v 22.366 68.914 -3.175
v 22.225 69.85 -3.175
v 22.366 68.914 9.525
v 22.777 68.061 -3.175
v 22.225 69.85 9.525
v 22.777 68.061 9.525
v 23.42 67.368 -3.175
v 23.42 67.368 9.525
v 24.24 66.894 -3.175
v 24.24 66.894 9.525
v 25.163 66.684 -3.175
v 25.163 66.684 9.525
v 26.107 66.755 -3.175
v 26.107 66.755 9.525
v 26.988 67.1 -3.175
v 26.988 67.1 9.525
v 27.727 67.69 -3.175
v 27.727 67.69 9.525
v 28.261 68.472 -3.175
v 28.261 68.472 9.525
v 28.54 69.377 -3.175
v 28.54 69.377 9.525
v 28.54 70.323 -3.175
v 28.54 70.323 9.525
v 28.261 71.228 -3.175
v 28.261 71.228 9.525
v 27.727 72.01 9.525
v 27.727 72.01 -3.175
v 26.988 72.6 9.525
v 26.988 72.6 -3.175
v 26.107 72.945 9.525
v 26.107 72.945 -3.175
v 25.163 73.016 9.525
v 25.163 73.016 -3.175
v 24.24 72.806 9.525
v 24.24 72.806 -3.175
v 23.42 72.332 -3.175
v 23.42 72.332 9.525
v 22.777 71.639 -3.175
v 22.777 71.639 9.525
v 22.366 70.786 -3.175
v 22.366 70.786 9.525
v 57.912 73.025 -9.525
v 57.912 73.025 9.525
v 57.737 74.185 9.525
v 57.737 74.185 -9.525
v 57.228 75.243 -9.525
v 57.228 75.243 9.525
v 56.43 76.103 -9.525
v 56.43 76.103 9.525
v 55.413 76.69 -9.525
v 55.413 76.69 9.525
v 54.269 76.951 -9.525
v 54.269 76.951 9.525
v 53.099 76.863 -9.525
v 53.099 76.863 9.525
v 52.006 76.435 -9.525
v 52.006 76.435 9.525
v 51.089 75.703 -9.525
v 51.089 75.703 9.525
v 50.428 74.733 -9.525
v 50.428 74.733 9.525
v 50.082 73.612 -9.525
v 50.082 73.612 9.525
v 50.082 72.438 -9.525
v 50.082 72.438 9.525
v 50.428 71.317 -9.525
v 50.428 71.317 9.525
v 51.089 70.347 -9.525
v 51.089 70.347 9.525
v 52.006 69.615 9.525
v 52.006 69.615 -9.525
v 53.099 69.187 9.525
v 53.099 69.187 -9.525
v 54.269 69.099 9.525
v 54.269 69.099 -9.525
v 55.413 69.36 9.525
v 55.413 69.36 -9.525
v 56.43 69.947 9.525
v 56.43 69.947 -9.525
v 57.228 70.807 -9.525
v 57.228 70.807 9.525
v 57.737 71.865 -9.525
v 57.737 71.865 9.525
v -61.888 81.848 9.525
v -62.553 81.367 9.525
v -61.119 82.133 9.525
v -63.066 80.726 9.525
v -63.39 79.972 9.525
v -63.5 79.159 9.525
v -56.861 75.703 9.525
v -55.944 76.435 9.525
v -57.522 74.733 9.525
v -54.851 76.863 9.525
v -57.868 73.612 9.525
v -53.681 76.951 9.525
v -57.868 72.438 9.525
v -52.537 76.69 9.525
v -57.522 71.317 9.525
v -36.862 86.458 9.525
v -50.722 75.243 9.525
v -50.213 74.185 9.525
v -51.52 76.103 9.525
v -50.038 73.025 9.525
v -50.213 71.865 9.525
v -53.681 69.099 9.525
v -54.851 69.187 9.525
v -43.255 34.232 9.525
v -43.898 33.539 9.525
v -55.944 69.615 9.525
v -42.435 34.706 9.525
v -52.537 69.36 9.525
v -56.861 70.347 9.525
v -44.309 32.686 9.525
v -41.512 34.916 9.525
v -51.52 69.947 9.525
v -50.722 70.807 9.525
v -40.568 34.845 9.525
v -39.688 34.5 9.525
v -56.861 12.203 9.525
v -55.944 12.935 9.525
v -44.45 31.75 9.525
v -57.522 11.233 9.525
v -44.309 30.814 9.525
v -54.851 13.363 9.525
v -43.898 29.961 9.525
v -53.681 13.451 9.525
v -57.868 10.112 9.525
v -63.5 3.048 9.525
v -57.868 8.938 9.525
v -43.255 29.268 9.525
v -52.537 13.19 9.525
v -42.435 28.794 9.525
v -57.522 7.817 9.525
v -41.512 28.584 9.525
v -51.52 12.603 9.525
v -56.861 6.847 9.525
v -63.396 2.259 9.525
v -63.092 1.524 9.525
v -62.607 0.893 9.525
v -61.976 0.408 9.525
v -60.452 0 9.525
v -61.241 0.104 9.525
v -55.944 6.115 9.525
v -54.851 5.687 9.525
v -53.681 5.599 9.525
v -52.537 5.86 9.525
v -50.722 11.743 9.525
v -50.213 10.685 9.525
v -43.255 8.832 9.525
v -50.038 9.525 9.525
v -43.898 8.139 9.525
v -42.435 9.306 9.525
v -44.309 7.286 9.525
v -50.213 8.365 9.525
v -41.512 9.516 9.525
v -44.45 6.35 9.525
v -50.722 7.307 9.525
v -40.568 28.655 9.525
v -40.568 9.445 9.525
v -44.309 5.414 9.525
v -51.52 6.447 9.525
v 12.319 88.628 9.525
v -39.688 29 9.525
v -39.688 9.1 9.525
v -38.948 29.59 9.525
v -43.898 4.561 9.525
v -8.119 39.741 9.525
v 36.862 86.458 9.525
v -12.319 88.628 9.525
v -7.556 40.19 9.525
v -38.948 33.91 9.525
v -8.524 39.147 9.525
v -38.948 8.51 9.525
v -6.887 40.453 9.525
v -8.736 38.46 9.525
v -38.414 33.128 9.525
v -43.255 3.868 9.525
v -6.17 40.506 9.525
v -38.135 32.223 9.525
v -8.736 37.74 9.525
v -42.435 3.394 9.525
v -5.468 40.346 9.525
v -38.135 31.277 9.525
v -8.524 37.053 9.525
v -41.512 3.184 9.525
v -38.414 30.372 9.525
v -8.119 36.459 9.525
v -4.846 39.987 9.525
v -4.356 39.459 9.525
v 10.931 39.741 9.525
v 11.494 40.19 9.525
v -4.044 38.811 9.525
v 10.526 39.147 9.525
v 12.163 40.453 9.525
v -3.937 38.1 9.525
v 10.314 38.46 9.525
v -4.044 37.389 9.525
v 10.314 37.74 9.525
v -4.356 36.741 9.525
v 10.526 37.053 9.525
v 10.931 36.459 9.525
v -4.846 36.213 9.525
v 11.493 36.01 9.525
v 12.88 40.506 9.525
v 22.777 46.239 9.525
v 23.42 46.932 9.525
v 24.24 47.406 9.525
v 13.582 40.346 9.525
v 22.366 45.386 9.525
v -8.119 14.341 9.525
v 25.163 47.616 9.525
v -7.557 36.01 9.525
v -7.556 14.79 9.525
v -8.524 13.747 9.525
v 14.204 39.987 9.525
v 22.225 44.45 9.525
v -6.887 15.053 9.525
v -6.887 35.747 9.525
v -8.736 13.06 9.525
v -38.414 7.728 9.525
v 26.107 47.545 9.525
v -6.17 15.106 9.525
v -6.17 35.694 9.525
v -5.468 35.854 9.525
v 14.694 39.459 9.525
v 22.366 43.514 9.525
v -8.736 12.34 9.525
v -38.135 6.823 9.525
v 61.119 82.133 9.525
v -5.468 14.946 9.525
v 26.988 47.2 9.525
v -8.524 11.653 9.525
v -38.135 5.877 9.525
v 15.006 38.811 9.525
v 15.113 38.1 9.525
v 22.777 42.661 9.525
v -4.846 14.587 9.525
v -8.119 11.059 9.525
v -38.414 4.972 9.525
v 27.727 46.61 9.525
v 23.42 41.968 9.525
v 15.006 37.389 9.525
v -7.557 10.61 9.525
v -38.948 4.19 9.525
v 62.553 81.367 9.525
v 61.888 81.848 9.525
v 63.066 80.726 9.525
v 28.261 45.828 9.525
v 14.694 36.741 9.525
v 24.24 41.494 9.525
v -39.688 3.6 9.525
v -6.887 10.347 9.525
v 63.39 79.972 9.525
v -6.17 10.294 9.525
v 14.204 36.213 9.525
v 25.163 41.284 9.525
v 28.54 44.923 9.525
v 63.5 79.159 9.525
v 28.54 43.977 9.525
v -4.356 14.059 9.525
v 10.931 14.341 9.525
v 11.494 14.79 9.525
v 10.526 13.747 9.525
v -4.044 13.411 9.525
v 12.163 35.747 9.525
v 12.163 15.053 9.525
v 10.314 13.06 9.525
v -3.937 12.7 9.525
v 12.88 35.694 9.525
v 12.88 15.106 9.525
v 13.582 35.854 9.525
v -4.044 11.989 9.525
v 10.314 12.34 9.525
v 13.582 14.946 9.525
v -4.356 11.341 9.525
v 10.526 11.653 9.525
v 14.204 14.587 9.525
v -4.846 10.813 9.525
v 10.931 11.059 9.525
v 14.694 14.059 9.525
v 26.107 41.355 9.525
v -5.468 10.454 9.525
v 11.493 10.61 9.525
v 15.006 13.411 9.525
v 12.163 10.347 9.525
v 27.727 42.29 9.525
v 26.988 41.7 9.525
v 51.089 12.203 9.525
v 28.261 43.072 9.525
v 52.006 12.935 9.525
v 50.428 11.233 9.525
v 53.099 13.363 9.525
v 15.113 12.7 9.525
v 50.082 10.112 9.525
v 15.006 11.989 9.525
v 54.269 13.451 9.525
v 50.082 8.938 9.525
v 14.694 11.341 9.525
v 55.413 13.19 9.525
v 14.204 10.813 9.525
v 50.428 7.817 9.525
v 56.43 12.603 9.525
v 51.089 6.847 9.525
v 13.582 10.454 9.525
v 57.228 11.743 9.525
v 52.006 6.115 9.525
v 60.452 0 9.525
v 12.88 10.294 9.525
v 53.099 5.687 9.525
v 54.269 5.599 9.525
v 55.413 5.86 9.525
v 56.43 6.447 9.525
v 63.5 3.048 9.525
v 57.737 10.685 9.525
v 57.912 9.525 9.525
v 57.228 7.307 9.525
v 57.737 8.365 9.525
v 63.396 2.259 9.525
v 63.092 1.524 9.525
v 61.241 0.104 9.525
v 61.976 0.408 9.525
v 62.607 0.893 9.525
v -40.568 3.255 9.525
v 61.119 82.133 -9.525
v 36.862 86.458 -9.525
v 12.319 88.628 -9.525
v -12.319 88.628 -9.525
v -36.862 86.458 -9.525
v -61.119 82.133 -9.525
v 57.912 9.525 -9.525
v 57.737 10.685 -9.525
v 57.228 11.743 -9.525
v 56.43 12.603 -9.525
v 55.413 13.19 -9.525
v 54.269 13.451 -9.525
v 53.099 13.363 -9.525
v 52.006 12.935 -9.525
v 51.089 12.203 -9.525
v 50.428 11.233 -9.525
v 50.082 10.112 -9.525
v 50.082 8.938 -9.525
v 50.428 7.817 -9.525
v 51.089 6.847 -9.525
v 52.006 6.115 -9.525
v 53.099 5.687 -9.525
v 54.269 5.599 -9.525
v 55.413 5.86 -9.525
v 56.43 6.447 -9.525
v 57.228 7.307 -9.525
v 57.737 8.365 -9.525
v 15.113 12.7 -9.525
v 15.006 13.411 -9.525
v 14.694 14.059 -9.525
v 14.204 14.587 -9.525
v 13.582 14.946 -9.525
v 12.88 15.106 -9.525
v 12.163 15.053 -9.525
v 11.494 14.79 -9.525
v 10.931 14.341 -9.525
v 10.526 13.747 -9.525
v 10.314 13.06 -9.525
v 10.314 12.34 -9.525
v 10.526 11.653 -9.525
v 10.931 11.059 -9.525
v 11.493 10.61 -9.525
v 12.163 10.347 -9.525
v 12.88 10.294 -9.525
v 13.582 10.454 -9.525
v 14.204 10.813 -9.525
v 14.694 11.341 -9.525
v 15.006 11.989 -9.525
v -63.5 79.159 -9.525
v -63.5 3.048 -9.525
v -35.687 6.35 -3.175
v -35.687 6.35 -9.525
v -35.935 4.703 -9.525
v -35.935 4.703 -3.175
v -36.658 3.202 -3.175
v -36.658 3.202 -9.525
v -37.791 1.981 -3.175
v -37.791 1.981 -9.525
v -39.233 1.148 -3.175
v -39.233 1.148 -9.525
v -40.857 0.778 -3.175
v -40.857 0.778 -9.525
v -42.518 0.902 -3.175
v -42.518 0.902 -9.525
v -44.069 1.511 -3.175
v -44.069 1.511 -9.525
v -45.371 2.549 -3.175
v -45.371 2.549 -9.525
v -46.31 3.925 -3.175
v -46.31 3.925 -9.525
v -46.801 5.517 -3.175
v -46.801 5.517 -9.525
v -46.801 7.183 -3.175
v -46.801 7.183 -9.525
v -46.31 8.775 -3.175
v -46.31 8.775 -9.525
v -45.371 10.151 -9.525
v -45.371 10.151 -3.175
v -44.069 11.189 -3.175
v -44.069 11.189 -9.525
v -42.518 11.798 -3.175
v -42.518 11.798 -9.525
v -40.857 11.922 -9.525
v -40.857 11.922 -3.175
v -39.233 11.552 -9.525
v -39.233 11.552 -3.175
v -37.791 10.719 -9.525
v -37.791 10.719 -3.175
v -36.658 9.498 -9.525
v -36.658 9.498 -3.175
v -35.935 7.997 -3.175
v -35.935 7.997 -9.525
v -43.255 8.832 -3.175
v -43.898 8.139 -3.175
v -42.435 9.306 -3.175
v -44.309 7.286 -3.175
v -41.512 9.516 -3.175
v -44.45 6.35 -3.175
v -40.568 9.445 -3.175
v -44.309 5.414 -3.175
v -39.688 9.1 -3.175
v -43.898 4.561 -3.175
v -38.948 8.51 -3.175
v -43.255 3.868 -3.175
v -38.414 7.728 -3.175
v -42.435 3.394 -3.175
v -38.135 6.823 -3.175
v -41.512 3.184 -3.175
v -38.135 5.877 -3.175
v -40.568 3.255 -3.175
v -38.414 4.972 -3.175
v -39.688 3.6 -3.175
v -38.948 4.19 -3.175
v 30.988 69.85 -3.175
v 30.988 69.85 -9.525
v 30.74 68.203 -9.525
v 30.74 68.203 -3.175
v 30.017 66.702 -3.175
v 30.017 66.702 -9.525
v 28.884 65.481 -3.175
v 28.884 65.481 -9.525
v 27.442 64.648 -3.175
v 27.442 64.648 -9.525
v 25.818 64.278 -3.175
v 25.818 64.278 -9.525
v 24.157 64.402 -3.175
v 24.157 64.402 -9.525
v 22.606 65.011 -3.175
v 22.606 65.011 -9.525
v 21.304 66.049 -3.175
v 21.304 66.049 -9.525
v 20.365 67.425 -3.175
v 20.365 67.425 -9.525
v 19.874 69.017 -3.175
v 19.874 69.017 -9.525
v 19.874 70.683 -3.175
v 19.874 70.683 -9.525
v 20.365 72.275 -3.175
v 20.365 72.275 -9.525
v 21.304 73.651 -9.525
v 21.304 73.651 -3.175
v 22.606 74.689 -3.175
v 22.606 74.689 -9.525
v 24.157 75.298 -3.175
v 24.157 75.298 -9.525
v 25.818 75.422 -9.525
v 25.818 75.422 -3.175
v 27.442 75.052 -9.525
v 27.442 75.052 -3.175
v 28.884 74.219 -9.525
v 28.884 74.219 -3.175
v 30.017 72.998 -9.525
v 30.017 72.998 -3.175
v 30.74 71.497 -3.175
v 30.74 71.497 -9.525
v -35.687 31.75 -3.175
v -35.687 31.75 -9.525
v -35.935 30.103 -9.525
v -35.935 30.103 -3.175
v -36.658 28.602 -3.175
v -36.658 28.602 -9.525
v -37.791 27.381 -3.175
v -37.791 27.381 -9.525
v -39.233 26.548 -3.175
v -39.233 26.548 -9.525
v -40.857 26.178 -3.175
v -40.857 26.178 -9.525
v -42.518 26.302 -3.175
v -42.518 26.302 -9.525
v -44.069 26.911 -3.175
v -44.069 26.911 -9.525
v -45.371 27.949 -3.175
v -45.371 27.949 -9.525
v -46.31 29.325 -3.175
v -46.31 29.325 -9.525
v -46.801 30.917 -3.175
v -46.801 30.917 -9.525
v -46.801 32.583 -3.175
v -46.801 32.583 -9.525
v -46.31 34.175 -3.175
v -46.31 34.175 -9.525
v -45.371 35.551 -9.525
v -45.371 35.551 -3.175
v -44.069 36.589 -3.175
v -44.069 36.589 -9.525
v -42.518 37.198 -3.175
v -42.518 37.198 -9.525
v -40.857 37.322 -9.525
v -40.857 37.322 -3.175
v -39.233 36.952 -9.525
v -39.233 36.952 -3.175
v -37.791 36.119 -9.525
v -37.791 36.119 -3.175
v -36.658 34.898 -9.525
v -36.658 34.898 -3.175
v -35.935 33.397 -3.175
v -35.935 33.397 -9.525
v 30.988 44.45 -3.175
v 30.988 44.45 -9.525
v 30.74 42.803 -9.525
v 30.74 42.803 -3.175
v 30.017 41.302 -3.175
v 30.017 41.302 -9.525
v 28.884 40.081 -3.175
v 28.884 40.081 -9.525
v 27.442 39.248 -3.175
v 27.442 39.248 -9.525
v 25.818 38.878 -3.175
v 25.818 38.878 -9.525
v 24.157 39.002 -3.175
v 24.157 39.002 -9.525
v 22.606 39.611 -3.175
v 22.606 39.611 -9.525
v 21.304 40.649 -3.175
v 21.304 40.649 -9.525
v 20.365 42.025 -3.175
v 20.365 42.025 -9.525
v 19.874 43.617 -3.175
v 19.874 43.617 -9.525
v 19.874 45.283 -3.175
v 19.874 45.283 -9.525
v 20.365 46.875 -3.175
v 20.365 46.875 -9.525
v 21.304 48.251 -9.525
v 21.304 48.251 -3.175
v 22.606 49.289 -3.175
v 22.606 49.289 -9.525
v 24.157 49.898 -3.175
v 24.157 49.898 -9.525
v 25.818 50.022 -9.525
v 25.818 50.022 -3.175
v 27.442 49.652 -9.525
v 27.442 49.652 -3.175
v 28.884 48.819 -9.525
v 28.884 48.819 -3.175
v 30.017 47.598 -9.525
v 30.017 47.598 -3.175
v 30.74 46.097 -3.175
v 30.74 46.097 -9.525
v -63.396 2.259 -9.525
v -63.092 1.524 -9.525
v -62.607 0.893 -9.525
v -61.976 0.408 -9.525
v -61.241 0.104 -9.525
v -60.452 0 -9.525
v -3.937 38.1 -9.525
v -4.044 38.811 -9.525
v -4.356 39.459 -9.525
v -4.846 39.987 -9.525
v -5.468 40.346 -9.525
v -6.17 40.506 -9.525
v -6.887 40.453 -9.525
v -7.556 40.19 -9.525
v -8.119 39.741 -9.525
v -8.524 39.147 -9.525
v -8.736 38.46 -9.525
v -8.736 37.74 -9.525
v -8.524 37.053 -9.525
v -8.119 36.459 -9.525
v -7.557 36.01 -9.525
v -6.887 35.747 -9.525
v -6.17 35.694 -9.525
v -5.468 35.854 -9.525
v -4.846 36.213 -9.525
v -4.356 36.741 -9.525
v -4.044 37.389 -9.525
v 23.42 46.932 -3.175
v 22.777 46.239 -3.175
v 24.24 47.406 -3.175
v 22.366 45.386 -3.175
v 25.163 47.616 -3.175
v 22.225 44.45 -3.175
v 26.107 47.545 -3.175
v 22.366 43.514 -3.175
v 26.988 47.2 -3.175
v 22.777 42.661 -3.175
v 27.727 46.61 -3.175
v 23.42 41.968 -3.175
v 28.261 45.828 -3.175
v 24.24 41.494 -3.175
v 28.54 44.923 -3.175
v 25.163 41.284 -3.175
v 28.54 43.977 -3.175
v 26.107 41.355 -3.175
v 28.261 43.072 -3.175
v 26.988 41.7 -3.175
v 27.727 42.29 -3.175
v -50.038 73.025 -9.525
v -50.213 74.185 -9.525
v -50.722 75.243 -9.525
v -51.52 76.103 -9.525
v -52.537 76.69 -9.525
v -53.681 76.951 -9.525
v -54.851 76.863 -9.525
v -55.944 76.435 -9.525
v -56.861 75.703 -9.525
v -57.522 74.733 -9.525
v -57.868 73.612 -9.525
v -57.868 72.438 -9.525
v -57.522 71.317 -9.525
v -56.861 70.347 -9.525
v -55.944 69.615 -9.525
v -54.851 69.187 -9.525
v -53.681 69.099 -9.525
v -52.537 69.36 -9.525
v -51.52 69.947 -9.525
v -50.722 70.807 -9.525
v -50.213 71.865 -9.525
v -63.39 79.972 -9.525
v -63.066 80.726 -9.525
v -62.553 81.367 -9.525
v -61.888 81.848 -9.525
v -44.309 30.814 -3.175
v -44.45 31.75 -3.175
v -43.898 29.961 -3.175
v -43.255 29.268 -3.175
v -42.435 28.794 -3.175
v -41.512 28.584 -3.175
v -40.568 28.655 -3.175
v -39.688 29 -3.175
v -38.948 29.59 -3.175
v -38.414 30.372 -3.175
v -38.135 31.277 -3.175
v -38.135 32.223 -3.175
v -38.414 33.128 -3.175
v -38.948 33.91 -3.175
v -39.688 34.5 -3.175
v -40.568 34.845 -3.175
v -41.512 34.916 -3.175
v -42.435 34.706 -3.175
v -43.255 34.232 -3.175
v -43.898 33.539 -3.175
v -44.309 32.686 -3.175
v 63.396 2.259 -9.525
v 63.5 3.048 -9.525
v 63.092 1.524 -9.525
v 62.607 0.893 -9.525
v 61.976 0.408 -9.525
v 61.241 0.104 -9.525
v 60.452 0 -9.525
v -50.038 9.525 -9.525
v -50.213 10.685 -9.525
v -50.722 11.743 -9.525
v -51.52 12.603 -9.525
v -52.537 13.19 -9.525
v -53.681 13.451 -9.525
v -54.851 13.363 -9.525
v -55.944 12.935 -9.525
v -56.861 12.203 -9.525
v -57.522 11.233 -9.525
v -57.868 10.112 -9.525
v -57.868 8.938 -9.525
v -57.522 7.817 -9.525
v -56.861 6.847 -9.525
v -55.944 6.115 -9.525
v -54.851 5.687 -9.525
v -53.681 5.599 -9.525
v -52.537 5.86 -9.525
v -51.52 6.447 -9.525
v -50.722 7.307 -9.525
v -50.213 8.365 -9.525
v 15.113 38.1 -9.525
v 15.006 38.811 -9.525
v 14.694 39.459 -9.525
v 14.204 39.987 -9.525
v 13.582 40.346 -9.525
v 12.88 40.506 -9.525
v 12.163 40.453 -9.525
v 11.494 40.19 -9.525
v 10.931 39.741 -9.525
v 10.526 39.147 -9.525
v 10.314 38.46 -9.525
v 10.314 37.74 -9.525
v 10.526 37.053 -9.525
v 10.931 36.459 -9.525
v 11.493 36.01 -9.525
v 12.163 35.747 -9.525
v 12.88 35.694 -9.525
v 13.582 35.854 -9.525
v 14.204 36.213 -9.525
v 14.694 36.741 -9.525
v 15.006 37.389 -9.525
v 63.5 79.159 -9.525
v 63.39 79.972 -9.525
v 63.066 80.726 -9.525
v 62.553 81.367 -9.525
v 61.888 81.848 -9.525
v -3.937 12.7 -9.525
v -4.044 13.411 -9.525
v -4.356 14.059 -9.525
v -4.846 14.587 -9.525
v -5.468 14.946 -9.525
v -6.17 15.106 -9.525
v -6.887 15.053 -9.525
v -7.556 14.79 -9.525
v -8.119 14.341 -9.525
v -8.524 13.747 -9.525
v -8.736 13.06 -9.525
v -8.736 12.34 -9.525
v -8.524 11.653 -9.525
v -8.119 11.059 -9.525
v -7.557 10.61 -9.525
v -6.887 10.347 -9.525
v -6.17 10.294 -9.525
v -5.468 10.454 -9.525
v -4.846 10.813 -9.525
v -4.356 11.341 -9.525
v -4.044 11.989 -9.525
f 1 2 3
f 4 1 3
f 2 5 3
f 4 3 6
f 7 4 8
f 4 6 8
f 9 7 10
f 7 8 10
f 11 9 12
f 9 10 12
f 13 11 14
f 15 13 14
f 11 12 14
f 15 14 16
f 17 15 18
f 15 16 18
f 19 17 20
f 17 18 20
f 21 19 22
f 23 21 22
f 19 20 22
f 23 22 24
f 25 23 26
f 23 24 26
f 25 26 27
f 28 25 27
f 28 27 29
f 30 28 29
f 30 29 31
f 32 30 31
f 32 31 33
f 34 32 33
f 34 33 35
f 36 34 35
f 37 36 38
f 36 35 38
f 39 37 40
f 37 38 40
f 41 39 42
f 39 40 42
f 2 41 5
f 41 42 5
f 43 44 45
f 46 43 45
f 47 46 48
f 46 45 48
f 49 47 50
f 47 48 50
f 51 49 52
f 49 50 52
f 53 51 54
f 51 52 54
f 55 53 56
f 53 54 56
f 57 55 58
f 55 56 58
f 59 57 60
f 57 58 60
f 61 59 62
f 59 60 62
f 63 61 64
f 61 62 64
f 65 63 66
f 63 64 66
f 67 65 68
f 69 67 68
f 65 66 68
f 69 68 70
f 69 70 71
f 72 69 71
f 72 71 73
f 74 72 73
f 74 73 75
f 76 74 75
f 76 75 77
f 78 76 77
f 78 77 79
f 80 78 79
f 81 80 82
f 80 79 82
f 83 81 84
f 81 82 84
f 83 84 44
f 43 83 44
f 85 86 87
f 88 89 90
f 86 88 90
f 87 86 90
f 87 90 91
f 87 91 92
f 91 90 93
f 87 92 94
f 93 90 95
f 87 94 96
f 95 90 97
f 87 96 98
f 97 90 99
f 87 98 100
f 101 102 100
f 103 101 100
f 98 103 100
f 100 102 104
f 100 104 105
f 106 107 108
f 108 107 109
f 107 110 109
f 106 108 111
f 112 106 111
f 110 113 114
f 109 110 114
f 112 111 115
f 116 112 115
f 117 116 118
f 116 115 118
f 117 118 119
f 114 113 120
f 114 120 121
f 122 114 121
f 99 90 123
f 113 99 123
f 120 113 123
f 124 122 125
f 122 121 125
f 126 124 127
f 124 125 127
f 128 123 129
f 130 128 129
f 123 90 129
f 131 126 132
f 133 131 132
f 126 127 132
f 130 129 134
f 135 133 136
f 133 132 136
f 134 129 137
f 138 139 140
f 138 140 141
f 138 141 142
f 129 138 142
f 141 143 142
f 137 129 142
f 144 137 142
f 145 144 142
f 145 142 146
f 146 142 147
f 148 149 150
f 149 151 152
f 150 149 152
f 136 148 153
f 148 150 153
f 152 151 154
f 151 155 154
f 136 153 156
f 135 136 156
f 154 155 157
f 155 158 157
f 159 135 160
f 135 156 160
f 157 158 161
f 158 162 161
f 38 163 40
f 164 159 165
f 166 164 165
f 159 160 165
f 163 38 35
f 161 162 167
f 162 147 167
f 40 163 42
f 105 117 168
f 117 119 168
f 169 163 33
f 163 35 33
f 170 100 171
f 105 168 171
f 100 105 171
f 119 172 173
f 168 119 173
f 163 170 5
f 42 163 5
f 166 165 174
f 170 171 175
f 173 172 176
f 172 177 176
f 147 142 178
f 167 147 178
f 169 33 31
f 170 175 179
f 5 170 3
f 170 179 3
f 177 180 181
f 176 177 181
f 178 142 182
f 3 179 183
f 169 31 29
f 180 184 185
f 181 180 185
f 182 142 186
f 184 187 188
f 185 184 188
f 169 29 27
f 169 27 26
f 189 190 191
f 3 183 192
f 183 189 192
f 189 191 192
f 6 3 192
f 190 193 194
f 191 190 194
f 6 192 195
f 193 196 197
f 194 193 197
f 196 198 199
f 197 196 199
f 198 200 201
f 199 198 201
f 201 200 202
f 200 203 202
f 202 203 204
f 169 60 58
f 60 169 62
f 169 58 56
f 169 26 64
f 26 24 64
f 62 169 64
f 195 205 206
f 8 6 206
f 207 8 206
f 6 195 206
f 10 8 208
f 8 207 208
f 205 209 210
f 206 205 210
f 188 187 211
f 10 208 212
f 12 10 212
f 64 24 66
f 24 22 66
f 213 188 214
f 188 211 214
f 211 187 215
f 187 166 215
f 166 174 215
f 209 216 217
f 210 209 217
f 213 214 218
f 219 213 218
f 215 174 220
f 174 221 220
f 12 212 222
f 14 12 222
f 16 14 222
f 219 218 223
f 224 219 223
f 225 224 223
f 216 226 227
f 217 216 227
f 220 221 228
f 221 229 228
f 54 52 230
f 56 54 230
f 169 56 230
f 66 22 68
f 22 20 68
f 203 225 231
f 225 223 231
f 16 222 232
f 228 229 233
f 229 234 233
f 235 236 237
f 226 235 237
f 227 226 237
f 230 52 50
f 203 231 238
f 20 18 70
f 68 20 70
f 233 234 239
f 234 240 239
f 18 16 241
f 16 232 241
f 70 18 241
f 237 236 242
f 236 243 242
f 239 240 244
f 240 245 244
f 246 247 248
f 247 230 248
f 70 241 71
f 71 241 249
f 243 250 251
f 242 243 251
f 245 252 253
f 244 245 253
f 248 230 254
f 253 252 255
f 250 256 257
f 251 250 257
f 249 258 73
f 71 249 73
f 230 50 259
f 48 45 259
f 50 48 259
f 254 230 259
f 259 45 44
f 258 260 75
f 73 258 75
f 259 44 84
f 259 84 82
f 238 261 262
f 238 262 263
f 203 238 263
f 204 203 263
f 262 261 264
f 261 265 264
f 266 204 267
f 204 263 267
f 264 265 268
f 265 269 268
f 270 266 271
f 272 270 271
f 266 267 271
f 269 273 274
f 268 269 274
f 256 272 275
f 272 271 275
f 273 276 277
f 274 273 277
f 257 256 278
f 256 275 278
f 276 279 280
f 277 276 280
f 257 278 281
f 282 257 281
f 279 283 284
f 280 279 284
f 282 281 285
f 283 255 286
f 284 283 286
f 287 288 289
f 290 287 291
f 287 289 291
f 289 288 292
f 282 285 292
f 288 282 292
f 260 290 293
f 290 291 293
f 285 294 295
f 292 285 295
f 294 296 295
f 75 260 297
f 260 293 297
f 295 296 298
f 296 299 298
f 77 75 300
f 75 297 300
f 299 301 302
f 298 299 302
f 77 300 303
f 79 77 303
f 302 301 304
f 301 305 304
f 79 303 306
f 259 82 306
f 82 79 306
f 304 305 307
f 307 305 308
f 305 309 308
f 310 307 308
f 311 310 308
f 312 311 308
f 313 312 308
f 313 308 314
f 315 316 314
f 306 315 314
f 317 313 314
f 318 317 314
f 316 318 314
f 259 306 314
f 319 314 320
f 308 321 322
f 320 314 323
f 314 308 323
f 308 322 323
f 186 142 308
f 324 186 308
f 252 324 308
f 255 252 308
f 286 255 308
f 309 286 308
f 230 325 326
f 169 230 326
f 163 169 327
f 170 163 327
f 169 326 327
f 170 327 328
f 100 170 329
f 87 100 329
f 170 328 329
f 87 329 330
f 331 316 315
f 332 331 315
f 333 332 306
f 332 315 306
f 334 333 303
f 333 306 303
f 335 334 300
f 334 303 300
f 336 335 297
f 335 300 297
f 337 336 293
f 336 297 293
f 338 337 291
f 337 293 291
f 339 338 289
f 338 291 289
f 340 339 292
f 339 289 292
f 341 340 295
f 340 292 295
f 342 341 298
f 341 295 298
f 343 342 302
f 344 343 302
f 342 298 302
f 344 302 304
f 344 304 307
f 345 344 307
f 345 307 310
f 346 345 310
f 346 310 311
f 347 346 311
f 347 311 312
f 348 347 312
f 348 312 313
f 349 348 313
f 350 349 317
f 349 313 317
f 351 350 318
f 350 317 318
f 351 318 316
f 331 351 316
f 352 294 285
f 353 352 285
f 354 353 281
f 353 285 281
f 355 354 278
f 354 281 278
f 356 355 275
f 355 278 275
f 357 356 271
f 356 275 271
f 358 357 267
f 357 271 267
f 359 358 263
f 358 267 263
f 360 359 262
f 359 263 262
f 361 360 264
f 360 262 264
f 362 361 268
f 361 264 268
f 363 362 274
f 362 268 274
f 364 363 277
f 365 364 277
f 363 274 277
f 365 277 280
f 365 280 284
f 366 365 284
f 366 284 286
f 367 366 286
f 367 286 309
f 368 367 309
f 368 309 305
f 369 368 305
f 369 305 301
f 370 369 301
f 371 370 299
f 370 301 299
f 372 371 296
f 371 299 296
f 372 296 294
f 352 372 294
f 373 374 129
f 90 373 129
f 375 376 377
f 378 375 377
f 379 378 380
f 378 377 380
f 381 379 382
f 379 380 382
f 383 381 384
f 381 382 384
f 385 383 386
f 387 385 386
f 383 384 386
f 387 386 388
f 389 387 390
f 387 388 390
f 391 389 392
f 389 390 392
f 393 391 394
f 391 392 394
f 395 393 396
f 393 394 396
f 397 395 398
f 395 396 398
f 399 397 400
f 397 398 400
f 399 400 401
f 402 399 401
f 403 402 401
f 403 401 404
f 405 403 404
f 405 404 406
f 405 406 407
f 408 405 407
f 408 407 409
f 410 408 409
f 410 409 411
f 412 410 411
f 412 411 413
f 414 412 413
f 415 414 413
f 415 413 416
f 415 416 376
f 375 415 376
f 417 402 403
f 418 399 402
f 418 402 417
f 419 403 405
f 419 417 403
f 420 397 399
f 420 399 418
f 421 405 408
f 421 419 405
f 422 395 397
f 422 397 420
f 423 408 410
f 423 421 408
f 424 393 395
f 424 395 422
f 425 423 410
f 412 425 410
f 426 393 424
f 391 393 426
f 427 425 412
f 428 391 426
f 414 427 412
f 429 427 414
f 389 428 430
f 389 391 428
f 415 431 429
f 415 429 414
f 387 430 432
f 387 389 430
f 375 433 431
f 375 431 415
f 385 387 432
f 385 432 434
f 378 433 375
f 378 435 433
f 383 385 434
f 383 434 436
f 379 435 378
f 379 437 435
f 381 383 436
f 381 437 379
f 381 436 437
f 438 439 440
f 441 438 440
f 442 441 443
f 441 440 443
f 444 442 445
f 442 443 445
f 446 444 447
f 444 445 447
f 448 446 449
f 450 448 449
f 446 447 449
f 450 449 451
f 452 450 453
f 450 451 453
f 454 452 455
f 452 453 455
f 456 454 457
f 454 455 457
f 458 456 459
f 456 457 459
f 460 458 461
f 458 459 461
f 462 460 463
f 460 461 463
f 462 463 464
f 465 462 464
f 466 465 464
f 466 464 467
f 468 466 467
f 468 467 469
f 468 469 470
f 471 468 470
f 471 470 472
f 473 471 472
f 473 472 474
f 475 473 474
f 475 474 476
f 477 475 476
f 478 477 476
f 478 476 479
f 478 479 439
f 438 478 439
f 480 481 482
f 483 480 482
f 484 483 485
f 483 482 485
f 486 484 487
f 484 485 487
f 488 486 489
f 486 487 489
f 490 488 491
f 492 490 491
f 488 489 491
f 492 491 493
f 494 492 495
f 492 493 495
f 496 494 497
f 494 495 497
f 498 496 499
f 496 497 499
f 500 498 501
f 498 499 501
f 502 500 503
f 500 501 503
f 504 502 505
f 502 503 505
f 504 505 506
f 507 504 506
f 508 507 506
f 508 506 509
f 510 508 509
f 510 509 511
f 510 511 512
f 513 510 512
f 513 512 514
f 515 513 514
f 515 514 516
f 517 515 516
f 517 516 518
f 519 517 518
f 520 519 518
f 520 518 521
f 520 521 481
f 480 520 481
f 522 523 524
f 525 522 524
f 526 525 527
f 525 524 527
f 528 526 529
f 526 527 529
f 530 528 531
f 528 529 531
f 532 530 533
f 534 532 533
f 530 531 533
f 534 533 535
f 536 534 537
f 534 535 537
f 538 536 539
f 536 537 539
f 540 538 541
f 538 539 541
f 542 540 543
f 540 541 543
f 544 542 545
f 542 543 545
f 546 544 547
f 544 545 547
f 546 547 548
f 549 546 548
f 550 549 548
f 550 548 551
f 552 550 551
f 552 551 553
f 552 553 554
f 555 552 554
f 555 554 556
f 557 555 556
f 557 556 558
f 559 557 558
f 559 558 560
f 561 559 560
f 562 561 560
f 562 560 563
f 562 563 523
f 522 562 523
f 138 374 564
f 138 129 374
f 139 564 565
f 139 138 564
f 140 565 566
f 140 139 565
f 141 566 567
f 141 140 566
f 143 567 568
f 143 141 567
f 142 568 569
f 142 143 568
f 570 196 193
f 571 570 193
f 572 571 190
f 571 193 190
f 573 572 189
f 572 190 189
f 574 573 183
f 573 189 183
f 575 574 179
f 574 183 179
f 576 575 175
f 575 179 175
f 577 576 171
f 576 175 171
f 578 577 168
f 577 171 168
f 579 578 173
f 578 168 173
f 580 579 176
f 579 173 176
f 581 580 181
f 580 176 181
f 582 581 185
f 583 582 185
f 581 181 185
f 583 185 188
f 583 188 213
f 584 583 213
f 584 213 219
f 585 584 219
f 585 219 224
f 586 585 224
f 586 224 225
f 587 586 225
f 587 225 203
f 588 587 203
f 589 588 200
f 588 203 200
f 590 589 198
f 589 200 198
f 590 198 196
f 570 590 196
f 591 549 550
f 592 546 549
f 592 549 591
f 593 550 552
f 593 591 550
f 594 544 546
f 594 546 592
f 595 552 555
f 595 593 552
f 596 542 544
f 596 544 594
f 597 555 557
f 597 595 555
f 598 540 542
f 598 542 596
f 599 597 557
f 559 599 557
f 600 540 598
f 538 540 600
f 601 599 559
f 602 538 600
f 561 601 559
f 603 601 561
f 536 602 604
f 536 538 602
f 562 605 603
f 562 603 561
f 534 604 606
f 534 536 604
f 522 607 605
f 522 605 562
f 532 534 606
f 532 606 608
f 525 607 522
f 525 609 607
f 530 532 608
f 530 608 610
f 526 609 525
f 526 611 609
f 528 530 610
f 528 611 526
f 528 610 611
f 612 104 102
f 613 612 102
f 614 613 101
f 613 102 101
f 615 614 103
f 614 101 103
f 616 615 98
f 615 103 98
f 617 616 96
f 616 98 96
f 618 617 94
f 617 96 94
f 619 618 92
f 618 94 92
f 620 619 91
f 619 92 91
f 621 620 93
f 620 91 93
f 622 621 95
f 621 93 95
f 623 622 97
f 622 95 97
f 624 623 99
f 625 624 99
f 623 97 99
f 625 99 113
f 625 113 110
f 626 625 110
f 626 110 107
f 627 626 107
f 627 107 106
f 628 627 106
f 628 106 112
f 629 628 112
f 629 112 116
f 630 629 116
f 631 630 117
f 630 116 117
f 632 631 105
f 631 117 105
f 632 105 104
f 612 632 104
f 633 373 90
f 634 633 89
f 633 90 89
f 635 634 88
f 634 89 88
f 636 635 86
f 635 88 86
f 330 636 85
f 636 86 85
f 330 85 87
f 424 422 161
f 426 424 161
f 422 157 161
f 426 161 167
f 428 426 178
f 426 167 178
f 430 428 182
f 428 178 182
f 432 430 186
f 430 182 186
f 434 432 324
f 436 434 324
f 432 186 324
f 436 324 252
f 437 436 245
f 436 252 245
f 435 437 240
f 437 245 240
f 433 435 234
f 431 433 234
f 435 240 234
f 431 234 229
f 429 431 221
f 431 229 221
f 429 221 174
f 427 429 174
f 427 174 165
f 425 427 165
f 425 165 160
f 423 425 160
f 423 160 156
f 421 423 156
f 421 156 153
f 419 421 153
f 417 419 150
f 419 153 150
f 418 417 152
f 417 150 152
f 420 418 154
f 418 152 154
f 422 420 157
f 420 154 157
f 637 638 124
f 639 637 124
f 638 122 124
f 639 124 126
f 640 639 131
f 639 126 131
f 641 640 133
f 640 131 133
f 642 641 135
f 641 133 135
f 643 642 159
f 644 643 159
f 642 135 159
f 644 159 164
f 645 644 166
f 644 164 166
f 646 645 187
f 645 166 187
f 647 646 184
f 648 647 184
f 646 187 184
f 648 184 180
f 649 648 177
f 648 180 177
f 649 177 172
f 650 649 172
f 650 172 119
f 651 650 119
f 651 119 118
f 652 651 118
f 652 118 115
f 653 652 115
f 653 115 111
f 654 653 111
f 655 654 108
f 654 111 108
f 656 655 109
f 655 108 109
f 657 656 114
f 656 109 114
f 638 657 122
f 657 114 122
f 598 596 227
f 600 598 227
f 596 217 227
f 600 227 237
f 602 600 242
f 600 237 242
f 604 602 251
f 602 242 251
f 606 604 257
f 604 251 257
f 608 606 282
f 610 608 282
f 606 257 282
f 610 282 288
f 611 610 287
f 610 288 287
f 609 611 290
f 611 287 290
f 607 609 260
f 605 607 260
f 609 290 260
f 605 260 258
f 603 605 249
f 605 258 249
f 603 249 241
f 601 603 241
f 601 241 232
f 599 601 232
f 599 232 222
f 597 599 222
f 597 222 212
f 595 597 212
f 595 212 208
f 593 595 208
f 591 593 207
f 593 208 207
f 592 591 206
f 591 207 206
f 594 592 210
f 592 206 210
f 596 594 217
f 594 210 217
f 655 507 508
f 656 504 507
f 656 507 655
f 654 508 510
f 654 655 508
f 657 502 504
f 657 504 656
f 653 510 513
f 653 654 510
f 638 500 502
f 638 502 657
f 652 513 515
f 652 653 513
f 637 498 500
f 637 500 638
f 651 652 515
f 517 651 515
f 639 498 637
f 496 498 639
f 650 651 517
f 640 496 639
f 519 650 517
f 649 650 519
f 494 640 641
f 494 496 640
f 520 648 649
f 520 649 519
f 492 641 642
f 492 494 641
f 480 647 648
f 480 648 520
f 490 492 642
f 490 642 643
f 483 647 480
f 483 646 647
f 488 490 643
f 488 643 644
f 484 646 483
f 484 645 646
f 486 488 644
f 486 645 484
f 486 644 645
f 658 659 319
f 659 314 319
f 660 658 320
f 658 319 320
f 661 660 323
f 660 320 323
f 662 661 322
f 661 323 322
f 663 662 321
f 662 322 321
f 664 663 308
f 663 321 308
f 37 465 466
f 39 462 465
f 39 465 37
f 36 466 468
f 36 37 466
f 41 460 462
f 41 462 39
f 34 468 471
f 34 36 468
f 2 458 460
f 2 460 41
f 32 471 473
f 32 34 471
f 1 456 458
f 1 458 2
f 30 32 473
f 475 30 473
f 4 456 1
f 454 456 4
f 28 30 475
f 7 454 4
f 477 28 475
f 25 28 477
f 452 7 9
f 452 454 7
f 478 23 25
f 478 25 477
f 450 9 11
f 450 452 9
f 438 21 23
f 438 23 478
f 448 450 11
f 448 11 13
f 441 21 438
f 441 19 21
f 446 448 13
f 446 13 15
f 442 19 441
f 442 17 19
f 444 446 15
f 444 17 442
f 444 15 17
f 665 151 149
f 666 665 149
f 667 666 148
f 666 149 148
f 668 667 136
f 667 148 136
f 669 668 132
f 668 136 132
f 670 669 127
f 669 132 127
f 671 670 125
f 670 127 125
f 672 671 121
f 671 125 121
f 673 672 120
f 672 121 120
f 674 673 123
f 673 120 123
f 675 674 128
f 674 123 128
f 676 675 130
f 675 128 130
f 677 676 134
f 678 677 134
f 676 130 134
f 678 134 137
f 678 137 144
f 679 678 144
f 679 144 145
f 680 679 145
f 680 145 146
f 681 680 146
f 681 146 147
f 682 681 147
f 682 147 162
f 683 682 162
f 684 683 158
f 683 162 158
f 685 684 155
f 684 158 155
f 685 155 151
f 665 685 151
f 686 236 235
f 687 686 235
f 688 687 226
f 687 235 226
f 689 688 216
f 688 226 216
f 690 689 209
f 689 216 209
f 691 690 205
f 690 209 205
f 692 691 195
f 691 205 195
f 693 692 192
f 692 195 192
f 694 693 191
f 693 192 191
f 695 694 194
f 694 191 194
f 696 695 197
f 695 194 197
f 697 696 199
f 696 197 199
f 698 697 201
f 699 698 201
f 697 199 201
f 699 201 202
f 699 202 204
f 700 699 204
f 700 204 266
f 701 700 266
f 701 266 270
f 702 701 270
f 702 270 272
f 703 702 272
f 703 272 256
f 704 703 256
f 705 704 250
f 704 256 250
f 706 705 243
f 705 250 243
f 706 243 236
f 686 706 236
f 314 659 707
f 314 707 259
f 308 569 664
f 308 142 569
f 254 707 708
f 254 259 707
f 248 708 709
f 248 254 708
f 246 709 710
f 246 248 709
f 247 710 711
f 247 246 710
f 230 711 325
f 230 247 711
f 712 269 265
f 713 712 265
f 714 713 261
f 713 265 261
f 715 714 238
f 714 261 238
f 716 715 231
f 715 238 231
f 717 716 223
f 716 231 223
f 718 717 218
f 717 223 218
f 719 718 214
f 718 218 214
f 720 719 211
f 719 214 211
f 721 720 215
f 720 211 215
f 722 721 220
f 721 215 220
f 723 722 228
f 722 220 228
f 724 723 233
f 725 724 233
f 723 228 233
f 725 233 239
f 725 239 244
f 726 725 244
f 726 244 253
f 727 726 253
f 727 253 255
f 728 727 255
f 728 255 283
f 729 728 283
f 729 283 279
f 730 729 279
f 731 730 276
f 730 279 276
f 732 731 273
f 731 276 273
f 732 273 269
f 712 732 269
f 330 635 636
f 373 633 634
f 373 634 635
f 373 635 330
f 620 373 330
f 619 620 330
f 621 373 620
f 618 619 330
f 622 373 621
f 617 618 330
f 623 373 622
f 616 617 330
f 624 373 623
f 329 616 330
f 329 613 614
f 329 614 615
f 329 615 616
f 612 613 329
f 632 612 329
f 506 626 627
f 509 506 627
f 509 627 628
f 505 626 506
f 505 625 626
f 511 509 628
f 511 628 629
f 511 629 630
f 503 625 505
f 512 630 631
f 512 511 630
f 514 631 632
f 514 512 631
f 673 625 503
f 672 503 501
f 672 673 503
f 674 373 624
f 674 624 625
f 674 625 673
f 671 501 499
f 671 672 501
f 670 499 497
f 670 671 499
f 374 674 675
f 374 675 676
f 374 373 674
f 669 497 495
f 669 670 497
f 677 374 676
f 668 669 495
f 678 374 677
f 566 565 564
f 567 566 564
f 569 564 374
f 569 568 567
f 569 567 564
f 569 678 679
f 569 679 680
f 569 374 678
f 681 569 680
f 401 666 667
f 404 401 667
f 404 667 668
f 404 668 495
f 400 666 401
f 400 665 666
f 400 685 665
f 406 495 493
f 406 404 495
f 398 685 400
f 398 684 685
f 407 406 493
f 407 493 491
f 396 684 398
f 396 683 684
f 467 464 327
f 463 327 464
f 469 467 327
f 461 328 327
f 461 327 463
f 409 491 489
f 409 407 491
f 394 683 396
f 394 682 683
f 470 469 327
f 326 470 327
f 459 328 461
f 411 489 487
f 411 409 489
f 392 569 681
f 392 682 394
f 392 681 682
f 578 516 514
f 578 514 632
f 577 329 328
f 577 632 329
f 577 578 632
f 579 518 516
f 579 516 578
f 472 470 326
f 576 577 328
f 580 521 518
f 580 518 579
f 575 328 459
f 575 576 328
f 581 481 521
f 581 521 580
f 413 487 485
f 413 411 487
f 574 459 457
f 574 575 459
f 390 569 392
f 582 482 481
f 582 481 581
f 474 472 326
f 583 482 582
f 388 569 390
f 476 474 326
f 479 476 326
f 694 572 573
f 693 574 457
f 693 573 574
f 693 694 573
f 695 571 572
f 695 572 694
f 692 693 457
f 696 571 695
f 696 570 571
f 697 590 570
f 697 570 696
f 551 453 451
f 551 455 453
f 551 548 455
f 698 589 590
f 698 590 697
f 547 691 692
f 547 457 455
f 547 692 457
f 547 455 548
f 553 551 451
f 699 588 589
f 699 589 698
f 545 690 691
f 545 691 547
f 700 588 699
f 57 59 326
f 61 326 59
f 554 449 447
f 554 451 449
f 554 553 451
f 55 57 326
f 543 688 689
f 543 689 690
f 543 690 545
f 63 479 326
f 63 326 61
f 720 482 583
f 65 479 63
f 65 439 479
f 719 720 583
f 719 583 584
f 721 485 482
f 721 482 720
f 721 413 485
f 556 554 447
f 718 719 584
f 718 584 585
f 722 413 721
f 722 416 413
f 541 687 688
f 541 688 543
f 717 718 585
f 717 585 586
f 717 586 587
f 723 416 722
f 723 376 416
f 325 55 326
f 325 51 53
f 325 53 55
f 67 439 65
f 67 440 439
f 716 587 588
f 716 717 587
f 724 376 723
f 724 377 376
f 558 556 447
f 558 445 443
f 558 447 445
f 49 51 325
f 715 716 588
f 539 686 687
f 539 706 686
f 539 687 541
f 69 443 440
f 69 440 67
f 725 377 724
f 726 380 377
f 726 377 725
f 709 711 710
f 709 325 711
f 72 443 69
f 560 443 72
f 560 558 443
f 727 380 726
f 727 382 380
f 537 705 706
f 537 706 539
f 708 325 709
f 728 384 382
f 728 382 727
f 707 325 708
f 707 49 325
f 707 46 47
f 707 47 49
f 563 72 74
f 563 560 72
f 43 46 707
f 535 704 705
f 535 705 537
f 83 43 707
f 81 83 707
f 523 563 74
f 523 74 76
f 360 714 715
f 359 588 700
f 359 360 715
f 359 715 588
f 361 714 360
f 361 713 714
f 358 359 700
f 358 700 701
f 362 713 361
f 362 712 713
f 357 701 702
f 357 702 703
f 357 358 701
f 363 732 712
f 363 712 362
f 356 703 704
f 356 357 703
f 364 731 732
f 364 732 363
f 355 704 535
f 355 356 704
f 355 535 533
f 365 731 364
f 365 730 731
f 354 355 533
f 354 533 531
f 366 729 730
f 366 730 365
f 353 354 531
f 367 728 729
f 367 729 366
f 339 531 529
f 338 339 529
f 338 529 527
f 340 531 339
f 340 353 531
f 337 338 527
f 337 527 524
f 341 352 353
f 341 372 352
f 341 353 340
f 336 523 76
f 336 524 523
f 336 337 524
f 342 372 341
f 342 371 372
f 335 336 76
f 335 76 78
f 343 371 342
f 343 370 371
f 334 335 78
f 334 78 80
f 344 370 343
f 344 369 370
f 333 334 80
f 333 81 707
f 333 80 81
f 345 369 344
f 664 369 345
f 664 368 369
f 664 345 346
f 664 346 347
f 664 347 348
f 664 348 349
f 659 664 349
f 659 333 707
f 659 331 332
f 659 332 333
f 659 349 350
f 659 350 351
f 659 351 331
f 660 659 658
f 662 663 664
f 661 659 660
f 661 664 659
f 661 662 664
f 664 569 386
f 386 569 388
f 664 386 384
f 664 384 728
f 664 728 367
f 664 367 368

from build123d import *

# Parameters (mm, degrees)
F0_W           = 127
F0_H           = 19.05
F1_DEPTH       = 88.9
F2_R           = 3.937
F2_R_2         = 2.413
F3_DEPTH       = 19.05
F5_D           = 6.35
F5_CBORE_D     = 11.176
F5_CBORE_DEPTH = 6.35
F7_DEPTH       = 19.051
F8_R           = 3.048


with BuildPart() as f1:
    # F0 (on Front) → F1 (new body)
    with BuildSketch(Plane.XZ):
        Rectangle(F0_W, F0_H)
    extrude(amount=-F1_DEPTH)

    # F2 (on face) → F3 (cut, through all)
    with BuildSketch(Plane.XY.offset(9.525)):
        with Locations((-53.975, 73.025)):
            Circle(F2_R)
        with Locations((-53.975, 9.525)):
            Circle(F2_R)
        with Locations((53.975, 9.525)):
            Circle(F2_R)
        with Locations((53.975, 73.025)):
            Circle(F2_R)
        with Locations((-6.35, 38.1)):
            Circle(F2_R_2)
        with Locations((12.7, 38.1)):
            Circle(F2_R_2)
        with Locations((12.7, 12.7)):
            Circle(F2_R_2)
        with Locations((-6.35, 12.7)):
            Circle(F2_R_2)
    extrude(amount=-F3_DEPTH, mode=Mode.SUBTRACT)

    # F5 (through all)
    with Locations(Plane(origin=(0, 0, -9.525), x_dir=(1, 0, 0), z_dir=(0, 0, -1))):
        with Locations((25.4, -69.85), (25.4, -44.45), (-41.275, -31.75), (-41.275, -6.35)):
            CounterBoreHole(F5_D / 2, F5_CBORE_D / 2, F5_CBORE_DEPTH)

    # F6 (on face) → F7 (cut, through all)
    with BuildSketch(Plane(origin=(0, 0, -9.525), x_dir=(1, 0, 0), z_dir=(0, 0, -1))):
        with BuildLine():
            ThreePointArc((63.5, -81.5884231275), (0, -88.9), (-63.5, -81.5884231275))
            Line((-63.5, -81.5884231275), (-63.5, -94.2089855671))
            Line((-63.5, -94.2089855671), (63.5, -94.2089855671))
            Line((63.5, -94.2089855671), (63.5, -81.5884231275))
        make_face()
    extrude(amount=-F7_DEPTH, mode=Mode.SUBTRACT)

    # F8
    f8_edges = [f1.edges().sort_by_distance(p)[0] for p in [
        (63.5, 81.588423, 0),
        (63.5, 0, 0),
        (-63.5, 81.588423, 0),
        (-63.5, 0, 0),
    ]]
    fillet(f8_edges, radius=F8_R)


solid = f1.part
